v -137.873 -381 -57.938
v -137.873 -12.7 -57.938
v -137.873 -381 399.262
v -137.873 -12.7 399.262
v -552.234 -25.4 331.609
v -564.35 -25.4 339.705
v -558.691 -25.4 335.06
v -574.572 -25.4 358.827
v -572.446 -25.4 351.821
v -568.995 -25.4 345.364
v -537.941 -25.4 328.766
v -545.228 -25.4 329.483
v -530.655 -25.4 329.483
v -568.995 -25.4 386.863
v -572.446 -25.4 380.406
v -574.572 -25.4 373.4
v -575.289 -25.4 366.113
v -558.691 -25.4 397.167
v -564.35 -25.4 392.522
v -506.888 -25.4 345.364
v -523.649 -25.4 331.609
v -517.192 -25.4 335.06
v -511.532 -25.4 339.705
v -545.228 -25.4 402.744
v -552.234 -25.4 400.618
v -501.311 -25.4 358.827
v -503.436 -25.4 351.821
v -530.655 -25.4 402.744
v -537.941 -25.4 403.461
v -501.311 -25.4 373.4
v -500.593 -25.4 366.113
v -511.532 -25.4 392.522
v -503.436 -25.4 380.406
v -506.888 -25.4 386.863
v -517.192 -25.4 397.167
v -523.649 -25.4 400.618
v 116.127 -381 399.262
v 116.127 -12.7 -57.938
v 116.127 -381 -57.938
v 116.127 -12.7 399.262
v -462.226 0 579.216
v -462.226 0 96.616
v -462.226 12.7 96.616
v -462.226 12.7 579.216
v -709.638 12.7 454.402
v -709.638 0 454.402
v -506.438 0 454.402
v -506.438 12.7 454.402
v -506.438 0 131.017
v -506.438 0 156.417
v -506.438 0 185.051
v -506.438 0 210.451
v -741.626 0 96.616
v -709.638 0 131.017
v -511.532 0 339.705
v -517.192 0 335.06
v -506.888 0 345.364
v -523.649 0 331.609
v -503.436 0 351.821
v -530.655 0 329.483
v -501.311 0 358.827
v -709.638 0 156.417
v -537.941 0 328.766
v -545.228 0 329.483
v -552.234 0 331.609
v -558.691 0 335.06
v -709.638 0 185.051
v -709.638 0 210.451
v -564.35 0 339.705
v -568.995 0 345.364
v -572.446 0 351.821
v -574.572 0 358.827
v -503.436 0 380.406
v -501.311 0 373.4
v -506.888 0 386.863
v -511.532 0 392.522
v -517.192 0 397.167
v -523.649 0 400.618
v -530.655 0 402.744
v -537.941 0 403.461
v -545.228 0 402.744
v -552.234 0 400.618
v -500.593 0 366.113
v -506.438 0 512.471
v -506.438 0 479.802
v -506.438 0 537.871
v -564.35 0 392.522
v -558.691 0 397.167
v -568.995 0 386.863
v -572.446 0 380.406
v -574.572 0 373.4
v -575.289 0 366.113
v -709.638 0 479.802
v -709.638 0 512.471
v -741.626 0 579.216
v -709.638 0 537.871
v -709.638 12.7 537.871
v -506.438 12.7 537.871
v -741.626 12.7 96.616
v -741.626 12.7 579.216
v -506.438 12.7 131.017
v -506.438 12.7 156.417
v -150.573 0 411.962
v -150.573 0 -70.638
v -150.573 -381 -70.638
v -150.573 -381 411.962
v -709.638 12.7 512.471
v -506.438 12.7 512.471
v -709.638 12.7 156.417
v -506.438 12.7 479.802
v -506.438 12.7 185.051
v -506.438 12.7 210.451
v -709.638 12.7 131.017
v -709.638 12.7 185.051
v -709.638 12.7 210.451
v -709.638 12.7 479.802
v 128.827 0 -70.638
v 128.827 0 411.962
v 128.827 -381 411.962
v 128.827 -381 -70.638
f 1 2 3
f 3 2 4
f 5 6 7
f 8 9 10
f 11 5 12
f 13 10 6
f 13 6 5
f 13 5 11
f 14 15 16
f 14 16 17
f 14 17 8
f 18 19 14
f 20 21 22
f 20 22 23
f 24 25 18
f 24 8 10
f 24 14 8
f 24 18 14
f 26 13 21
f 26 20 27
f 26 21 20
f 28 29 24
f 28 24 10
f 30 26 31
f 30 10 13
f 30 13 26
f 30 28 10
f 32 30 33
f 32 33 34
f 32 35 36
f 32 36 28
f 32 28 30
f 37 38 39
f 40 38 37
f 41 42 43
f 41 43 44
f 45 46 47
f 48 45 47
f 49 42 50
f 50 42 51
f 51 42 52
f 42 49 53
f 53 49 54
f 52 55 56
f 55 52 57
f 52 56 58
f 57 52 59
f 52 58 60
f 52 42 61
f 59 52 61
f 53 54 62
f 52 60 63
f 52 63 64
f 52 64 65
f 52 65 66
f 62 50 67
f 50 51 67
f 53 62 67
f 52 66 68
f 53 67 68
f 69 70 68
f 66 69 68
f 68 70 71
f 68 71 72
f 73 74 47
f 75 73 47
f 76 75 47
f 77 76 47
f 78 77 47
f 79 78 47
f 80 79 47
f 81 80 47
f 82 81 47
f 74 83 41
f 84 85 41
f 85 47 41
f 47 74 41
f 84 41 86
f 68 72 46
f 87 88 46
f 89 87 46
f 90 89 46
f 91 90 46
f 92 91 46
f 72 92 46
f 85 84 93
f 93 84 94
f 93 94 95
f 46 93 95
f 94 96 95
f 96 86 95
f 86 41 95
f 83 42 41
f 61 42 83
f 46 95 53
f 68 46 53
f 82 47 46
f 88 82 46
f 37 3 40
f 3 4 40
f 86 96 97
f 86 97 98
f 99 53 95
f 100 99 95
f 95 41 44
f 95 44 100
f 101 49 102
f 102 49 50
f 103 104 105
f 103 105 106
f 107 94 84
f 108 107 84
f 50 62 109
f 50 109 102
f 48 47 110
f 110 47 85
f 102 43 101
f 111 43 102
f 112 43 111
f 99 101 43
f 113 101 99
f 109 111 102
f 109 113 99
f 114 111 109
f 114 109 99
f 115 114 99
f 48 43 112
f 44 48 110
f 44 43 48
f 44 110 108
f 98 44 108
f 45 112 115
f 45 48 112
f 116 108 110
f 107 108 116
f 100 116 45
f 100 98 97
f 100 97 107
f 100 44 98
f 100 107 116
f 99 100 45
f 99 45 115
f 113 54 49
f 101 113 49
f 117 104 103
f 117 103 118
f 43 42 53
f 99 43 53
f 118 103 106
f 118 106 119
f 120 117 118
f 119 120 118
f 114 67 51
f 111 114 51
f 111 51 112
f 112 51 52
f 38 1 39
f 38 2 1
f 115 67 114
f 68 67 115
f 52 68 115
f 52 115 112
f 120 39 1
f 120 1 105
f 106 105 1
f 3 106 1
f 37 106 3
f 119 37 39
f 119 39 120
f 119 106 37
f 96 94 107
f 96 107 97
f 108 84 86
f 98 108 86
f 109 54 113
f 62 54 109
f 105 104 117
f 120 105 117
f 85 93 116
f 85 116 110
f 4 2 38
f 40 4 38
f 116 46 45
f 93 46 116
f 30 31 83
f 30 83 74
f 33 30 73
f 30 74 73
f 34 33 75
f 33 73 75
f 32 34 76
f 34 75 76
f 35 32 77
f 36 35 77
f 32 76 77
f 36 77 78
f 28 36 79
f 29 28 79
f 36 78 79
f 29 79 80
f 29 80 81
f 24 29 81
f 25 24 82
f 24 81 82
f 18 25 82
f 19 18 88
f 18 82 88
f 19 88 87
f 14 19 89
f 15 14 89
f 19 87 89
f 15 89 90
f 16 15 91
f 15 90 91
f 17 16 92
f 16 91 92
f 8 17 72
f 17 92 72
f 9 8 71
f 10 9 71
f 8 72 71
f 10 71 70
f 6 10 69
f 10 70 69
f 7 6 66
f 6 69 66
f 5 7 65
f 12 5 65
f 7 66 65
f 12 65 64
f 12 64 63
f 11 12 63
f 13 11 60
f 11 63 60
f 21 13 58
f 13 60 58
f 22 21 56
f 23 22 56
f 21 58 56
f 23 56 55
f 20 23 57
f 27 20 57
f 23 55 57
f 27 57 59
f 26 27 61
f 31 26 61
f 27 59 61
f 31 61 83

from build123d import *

# Parameters (mm, degrees)
F0_W     = 279.4
F0_H     = 482.6
F1_DEPTH = 381
F2_W     = 279.4
F2_H     = 482.6
F3_DEPTH = 12.7
F4_T     = -12.7
F5_W     = 203.2
F5_H     = 25.4
F6_DEPTH = 25.4
F7_R     = 37.34784
F8_DEPTH = 25.4


with BuildPart() as f1:
    # F0 (on Front) → F1 (new body)
    with BuildSketch(Plane.XZ):
        with Locations((-10.872711, 170.661798)):
            Rectangle(F0_W, F0_H)
    extrude(amount=F1_DEPTH)

    # F4
    f4_openings = [f1.faces().sort_by_distance(p)[0] for p in [
        (-10.872711, -381, 170.661798),
    ]]
    offset(amount=F4_T, openings=f4_openings)


with BuildPart() as f3:
    # F2 (on face) → F3 (new body)
    with BuildSketch(Plane(origin=(0, 0, 0), x_dir=(-1, 0, 0), z_dir=(0, 1, 0))):
        with Locations((601.926123, 337.915613)):
            Rectangle(F2_W, F2_H)
    extrude(amount=F3_DEPTH)

    # F5 (on face) → F6 (cut)
    with BuildSketch(Plane.XZ):
        with Locations((-608.037659, 525.171259)):
            Rectangle(F5_W, F5_H)
        with Locations((-608.037659, 467.10194)):
            Rectangle(F5_W, F5_H)
        with Locations((-608.037659, 197.750875)):
            Rectangle(F5_W, F5_H)
        with Locations((-608.037659, 143.717357)):
            Rectangle(F5_W, F5_H)
    extrude(amount=-F6_DEPTH, mode=Mode.SUBTRACT)

    # F7 (on face) → F8 (join)
    with BuildSketch(Plane.XZ):
        with Locations((-537.941337, 366.113454)):
            Circle(F7_R)
    extrude(amount=F8_DEPTH)


solid = Compound([f1.part, f3.part])
